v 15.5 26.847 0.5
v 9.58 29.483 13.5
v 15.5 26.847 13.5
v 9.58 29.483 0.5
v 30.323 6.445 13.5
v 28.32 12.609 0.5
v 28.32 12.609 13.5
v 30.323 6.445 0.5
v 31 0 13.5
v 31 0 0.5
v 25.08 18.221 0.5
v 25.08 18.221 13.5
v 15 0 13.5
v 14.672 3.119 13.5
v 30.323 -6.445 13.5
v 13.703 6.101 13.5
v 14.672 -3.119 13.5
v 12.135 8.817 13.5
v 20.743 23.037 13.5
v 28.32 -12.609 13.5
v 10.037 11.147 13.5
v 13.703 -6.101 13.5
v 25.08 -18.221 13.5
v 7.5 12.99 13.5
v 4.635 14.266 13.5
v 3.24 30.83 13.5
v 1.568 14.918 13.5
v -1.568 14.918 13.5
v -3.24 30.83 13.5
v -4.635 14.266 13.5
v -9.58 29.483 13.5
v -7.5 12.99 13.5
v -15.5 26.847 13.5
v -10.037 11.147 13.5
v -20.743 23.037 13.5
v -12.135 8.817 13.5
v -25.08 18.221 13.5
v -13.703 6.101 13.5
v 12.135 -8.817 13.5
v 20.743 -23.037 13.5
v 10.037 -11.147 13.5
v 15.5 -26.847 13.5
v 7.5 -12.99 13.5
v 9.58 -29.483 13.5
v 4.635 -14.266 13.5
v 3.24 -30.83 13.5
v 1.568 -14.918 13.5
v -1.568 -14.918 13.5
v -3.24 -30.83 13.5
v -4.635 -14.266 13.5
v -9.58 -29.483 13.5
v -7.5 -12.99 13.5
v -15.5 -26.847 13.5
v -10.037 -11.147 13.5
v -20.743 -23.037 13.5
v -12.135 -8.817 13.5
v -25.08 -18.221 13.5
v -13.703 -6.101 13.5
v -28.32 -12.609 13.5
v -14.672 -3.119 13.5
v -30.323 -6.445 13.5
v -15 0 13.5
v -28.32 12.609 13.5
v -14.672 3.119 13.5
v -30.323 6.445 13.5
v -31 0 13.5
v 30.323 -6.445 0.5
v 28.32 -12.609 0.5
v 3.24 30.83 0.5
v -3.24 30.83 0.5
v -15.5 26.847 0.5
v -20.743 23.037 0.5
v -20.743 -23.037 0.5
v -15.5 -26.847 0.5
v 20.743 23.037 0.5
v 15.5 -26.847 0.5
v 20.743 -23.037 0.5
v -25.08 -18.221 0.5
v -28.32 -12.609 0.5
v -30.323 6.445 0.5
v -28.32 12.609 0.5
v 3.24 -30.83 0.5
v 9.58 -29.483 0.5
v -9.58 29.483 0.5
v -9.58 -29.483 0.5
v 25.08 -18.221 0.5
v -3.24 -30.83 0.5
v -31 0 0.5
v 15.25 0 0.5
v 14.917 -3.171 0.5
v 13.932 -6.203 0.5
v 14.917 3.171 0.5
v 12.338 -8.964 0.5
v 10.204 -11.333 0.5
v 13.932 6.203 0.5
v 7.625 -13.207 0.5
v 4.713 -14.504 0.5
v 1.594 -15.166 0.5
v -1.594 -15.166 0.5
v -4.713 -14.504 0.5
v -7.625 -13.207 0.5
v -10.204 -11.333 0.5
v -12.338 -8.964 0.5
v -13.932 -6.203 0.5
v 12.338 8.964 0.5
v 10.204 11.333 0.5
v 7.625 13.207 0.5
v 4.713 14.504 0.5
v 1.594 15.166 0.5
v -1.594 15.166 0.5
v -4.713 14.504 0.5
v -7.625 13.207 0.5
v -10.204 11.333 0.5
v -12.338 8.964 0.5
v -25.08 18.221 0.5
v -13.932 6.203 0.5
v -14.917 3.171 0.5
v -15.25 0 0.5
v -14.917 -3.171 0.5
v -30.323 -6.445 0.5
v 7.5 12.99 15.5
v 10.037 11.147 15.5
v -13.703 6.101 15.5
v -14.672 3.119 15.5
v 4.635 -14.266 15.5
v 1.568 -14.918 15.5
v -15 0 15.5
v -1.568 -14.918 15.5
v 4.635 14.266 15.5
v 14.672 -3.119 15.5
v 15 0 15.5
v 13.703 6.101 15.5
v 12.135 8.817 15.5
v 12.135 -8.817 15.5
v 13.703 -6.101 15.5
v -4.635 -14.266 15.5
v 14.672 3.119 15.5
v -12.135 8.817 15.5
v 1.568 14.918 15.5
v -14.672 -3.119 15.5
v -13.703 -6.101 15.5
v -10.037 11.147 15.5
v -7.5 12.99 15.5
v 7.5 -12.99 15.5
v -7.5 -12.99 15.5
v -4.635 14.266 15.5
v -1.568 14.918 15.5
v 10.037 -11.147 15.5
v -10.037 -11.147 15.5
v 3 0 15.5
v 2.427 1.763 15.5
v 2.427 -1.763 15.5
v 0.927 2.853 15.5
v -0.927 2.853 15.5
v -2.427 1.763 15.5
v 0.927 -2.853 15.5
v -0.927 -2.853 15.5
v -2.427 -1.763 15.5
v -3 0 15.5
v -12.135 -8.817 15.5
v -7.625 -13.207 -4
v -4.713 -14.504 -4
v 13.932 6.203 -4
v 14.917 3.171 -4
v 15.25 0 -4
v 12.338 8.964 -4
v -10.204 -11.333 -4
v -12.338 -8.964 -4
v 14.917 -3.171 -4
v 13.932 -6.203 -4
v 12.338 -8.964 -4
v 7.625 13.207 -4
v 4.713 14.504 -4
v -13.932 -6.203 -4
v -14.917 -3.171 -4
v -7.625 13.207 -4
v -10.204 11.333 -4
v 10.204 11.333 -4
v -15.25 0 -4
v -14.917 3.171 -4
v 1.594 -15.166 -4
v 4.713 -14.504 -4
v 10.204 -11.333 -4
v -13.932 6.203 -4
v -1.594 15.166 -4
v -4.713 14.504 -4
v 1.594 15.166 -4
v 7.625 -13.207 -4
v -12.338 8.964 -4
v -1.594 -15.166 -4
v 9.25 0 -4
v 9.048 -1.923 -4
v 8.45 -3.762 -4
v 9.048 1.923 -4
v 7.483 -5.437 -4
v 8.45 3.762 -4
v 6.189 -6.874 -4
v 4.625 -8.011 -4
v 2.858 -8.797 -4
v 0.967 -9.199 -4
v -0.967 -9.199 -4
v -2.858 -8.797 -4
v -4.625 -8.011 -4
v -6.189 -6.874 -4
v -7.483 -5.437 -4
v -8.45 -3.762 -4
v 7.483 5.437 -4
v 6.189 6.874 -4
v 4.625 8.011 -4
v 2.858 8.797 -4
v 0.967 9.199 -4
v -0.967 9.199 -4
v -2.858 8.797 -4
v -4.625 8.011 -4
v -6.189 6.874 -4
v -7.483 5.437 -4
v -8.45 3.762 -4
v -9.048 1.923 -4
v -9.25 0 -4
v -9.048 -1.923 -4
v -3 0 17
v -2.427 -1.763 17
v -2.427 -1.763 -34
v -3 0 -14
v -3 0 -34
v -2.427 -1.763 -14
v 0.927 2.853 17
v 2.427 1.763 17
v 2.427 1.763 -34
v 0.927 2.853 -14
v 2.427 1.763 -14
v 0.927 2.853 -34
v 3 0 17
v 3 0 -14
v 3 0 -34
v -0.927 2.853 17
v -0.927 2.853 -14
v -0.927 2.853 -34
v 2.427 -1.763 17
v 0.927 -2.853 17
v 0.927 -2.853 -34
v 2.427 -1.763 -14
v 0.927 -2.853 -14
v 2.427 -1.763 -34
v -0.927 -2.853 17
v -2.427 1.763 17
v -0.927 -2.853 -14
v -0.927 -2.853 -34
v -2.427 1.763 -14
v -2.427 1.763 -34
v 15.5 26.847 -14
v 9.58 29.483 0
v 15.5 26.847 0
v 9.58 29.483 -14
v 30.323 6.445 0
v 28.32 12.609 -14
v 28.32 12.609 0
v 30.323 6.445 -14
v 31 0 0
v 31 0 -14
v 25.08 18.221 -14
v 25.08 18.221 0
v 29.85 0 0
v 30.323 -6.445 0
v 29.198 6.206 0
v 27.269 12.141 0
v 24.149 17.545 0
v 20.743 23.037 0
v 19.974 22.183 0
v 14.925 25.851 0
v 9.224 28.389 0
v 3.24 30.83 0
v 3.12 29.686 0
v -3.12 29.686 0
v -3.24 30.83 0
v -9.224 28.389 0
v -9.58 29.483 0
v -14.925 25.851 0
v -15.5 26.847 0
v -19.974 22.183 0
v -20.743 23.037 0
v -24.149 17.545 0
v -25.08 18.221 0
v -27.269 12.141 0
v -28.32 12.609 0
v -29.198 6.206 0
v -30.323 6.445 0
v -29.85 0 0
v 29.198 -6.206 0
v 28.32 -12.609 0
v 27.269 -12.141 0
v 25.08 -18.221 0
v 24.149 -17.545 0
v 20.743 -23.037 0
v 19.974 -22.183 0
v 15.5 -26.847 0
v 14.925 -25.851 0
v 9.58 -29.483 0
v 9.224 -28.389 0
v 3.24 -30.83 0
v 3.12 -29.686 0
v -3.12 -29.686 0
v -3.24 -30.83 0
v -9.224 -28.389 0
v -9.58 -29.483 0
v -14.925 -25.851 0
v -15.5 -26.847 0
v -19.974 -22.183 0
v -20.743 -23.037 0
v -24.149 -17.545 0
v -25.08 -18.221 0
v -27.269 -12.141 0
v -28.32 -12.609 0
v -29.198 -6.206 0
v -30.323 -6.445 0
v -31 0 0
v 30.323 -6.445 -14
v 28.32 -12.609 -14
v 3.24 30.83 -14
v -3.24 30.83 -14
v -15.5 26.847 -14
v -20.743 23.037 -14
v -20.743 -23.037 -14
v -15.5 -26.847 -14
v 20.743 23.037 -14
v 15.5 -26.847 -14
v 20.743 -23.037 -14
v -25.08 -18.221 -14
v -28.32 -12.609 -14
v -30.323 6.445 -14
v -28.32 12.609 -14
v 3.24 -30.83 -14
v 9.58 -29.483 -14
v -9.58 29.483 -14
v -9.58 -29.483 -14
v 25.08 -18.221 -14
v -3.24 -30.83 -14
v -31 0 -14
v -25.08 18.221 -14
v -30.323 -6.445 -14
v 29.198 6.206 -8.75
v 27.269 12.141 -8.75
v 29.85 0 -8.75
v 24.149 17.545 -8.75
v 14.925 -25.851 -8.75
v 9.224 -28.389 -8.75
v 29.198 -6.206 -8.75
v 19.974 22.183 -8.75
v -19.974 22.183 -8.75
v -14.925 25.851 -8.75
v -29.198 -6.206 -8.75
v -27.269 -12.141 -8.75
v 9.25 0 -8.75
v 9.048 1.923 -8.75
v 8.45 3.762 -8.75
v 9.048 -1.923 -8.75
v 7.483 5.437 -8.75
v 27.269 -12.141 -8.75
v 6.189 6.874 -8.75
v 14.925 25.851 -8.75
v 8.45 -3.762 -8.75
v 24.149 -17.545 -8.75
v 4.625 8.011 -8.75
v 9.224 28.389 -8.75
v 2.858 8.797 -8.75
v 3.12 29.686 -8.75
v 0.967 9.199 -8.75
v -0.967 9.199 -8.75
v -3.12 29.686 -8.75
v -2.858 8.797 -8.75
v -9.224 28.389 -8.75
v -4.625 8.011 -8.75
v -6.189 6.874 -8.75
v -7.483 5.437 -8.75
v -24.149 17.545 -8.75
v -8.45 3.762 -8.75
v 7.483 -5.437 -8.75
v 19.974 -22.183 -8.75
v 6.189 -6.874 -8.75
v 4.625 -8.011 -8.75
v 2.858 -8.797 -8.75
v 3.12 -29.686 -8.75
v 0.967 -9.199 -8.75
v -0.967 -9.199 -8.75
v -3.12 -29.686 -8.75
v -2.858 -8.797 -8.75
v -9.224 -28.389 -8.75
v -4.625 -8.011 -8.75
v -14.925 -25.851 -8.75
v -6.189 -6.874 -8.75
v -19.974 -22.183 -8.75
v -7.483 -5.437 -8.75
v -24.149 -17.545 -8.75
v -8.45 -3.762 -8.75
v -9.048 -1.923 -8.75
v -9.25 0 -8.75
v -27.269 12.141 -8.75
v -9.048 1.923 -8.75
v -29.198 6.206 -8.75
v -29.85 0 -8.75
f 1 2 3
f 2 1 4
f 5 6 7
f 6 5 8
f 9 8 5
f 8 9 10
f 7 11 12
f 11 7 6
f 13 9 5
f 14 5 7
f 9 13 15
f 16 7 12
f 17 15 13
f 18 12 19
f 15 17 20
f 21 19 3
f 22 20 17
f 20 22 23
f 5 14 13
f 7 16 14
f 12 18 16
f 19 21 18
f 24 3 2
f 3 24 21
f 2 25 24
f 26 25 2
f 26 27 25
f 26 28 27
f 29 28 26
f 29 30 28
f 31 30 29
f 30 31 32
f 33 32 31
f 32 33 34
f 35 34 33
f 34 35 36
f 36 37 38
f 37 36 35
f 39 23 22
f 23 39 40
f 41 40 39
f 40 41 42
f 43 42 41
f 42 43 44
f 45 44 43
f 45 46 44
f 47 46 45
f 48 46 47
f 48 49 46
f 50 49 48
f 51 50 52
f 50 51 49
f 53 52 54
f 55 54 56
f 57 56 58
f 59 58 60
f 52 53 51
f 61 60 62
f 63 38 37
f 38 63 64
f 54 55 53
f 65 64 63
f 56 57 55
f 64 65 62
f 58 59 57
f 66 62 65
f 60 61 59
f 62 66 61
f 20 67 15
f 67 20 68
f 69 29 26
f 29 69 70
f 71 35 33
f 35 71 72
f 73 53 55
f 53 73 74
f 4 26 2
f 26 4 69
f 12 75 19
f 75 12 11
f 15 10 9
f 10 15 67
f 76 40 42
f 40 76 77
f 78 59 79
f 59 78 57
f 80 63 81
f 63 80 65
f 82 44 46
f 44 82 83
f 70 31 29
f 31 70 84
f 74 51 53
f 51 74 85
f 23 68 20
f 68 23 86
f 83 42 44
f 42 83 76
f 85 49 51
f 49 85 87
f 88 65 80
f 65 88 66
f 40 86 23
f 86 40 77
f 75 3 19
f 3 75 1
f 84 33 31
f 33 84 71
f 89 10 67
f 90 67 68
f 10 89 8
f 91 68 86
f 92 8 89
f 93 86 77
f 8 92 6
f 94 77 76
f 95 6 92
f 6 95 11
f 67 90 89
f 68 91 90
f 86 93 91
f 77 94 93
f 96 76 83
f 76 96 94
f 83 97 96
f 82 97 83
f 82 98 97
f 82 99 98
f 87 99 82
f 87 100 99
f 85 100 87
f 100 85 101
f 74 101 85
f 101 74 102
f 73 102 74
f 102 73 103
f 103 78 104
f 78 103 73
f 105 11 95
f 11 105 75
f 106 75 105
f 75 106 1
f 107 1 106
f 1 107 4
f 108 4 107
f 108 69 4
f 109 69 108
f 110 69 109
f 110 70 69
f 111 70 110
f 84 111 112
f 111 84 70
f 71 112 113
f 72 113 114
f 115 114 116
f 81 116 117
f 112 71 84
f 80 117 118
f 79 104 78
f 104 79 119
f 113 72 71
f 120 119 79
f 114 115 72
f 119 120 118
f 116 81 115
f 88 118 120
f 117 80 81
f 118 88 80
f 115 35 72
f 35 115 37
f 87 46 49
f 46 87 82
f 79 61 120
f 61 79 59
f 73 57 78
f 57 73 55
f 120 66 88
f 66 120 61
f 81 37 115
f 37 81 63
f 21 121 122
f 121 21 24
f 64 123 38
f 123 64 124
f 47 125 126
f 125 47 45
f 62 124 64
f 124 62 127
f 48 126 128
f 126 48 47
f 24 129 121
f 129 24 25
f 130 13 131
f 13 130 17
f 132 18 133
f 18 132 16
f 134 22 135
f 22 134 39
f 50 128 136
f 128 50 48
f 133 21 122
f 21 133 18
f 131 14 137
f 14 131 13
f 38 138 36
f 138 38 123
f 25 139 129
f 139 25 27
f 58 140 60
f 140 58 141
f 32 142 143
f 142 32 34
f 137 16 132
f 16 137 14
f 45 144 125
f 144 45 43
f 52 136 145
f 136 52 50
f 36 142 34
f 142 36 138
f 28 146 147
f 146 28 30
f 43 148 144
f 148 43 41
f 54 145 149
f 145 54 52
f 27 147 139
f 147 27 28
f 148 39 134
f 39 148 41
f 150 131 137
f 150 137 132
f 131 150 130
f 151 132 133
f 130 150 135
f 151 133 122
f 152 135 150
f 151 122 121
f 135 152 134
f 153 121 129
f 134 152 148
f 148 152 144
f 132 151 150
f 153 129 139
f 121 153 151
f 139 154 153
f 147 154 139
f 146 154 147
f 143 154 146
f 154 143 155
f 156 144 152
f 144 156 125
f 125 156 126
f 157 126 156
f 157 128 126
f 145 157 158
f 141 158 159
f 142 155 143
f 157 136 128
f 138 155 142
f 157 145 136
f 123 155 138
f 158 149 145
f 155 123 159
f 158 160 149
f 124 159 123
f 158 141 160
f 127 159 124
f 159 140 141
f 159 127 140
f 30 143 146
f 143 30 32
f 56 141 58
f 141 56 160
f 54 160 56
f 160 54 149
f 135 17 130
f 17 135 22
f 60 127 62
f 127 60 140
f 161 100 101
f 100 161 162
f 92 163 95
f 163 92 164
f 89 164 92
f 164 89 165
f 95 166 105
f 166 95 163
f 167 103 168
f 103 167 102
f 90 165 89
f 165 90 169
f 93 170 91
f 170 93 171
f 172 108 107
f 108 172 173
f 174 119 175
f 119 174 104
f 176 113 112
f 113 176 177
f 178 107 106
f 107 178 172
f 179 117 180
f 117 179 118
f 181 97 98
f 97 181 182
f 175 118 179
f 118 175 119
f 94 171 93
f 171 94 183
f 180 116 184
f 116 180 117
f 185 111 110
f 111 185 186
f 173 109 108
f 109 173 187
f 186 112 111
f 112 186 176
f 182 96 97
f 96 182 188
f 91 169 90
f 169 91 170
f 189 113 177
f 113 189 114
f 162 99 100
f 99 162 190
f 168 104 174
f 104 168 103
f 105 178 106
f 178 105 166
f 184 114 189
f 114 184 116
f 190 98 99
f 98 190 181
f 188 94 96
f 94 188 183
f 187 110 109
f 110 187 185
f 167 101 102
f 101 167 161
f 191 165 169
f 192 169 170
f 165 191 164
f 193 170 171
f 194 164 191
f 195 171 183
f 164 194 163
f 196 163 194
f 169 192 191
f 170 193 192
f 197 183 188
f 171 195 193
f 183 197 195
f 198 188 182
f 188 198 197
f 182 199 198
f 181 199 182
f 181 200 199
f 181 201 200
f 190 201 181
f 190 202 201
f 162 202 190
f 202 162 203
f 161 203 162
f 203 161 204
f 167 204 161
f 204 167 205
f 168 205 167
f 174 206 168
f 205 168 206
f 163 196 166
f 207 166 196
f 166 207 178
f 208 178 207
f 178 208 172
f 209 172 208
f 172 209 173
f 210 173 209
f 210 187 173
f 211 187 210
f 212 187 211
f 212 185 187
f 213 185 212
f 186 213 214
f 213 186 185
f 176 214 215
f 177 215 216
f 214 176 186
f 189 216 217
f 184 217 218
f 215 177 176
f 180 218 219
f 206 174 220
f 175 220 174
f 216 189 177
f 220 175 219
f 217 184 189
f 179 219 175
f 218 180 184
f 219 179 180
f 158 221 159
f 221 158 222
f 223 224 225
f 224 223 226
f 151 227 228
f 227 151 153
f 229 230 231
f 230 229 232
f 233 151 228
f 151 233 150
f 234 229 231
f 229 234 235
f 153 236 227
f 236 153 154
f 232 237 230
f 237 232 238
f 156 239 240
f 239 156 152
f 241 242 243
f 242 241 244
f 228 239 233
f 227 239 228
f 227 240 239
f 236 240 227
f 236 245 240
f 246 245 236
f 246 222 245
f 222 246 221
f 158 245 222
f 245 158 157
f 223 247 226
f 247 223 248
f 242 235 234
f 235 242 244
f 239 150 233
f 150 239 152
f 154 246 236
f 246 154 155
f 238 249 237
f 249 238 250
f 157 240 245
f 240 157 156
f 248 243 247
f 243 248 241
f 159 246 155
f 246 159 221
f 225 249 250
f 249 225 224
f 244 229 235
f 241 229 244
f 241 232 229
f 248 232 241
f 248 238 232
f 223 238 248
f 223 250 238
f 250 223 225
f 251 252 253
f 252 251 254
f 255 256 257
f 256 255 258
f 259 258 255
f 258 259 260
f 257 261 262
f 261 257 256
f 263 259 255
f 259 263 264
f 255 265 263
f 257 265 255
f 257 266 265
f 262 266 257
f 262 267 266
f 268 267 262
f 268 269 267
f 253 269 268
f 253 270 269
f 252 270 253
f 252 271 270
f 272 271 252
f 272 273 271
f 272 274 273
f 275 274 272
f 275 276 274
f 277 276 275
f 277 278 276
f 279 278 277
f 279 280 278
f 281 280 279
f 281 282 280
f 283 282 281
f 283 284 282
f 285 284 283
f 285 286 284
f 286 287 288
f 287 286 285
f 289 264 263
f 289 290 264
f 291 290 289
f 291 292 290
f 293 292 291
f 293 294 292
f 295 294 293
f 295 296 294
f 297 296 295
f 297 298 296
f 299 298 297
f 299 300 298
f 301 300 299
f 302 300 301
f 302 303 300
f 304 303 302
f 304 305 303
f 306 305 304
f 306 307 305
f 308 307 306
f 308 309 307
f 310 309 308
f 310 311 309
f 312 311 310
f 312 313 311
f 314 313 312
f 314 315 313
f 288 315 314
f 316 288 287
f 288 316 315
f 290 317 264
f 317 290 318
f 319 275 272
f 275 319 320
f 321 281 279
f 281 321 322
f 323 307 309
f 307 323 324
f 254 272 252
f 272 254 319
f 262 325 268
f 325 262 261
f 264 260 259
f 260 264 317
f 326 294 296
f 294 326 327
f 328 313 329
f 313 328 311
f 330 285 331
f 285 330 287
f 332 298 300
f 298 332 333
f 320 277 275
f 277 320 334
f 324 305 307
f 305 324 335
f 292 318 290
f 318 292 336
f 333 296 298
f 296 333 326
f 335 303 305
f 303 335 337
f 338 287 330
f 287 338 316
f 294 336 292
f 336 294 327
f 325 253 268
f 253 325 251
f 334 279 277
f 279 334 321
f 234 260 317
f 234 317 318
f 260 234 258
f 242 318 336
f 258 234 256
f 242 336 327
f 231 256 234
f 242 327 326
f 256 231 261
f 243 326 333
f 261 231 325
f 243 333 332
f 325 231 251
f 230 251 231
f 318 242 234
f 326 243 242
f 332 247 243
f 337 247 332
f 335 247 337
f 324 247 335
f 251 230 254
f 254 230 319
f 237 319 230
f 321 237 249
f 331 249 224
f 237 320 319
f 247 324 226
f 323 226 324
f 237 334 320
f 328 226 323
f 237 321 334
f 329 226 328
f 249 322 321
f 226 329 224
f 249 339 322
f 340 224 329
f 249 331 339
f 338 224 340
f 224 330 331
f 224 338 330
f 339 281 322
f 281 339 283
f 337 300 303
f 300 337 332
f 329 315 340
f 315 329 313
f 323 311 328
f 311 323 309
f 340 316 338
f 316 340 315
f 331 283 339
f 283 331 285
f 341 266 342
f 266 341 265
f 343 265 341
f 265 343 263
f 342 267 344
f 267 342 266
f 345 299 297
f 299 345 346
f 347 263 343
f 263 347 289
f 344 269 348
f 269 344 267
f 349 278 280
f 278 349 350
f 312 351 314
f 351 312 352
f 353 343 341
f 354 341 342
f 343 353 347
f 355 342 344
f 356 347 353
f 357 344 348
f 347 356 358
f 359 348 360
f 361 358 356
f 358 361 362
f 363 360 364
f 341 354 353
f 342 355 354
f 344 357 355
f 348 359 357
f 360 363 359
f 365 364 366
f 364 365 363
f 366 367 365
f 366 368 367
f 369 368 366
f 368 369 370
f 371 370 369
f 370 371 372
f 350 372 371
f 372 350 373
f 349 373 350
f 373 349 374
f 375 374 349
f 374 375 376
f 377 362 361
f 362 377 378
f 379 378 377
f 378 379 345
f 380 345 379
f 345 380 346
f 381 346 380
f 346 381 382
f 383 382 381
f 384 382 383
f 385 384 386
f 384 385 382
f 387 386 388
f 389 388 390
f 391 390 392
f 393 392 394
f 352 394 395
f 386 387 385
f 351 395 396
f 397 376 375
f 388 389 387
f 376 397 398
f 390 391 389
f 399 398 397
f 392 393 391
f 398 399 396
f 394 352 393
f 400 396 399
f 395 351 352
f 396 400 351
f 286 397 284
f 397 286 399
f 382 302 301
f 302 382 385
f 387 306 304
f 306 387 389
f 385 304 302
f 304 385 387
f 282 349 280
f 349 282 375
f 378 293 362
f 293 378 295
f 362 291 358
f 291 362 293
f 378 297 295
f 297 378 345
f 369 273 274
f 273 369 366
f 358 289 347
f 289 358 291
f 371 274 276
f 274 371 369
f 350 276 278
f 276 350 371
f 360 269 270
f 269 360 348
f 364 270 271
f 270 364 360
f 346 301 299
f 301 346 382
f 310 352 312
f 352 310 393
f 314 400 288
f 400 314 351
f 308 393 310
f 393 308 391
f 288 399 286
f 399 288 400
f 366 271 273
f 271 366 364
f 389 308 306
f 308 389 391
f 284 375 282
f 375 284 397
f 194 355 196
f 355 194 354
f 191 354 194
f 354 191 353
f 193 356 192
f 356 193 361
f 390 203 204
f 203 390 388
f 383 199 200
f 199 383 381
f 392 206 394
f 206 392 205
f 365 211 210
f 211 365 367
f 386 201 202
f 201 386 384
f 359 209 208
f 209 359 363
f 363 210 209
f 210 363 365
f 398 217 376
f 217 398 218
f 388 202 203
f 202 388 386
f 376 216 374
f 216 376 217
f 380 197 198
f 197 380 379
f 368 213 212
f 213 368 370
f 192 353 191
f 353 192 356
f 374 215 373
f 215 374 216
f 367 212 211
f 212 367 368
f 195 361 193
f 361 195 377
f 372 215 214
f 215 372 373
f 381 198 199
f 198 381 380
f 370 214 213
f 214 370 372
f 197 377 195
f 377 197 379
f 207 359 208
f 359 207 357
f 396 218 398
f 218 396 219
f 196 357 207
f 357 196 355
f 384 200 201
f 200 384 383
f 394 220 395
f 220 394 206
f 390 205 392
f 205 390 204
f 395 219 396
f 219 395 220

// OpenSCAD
vcrHeadOuterD=62;

//HeadTop

module HeadTop() {
    // the spiny bit
    ReadHeadouterHight=13;
    ReadHeadInnerHight=15;
    ReadHeadInnerD=30;
    //inerr lip is down 4 and thckness of 2 ma not be relavent
    cylinder(d=vcrHeadOuterD, h=ReadHeadouterHight, center=true);
    translate([0,0,(ReadHeadInnerHight-ReadHeadouterHight)/2 ]) 
     {
       cylinder(d=ReadHeadInnerD, h=ReadHeadInnerHight, center=true);
     }

     InnerFlangeHight=4.5;
 translate([0,0,(ReadHeadouterHight)/-2 +InnerFlangeHight/-2  ]) 
    cylinder(d=30.5,h=InnerFlangeHight, center=true);
   //Shaft
    translate([0,0, 51/-2 +10  ]) 

    cylinder(d=6,h=51, center=true);
}
module HeadBottem() {
    // body...
    outerHight=14;
    otherlipThickness=2.3;
    Depth=10.5;
difference()
{
    cylinder(d=vcrHeadOuterD, h=outerHight, center=true);
    translate([0, 0, outerHight-Depth]) {
    cylinder(d=vcrHeadOuterD-otherlipThickness, h=Depth, center=true);
        
    }
}
//center shaft holding bit
ShaftD=18.5; //maybe bigger in some areas
ShaftHight=18;
    translate([0, 0, ShaftHight/2-(outerHight-Depth)+1]) 
        cylinder(d=ShaftD, h=ShaftHight, center=true);   
}
translate([0,0,7])
color([20/255, 0/255, 200/255,.3]) {
  HeadTop();  
}
translate([0,0,-7])

color([200/255, 0/255, 200/255,.3]) {
  HeadBottem();  
}
